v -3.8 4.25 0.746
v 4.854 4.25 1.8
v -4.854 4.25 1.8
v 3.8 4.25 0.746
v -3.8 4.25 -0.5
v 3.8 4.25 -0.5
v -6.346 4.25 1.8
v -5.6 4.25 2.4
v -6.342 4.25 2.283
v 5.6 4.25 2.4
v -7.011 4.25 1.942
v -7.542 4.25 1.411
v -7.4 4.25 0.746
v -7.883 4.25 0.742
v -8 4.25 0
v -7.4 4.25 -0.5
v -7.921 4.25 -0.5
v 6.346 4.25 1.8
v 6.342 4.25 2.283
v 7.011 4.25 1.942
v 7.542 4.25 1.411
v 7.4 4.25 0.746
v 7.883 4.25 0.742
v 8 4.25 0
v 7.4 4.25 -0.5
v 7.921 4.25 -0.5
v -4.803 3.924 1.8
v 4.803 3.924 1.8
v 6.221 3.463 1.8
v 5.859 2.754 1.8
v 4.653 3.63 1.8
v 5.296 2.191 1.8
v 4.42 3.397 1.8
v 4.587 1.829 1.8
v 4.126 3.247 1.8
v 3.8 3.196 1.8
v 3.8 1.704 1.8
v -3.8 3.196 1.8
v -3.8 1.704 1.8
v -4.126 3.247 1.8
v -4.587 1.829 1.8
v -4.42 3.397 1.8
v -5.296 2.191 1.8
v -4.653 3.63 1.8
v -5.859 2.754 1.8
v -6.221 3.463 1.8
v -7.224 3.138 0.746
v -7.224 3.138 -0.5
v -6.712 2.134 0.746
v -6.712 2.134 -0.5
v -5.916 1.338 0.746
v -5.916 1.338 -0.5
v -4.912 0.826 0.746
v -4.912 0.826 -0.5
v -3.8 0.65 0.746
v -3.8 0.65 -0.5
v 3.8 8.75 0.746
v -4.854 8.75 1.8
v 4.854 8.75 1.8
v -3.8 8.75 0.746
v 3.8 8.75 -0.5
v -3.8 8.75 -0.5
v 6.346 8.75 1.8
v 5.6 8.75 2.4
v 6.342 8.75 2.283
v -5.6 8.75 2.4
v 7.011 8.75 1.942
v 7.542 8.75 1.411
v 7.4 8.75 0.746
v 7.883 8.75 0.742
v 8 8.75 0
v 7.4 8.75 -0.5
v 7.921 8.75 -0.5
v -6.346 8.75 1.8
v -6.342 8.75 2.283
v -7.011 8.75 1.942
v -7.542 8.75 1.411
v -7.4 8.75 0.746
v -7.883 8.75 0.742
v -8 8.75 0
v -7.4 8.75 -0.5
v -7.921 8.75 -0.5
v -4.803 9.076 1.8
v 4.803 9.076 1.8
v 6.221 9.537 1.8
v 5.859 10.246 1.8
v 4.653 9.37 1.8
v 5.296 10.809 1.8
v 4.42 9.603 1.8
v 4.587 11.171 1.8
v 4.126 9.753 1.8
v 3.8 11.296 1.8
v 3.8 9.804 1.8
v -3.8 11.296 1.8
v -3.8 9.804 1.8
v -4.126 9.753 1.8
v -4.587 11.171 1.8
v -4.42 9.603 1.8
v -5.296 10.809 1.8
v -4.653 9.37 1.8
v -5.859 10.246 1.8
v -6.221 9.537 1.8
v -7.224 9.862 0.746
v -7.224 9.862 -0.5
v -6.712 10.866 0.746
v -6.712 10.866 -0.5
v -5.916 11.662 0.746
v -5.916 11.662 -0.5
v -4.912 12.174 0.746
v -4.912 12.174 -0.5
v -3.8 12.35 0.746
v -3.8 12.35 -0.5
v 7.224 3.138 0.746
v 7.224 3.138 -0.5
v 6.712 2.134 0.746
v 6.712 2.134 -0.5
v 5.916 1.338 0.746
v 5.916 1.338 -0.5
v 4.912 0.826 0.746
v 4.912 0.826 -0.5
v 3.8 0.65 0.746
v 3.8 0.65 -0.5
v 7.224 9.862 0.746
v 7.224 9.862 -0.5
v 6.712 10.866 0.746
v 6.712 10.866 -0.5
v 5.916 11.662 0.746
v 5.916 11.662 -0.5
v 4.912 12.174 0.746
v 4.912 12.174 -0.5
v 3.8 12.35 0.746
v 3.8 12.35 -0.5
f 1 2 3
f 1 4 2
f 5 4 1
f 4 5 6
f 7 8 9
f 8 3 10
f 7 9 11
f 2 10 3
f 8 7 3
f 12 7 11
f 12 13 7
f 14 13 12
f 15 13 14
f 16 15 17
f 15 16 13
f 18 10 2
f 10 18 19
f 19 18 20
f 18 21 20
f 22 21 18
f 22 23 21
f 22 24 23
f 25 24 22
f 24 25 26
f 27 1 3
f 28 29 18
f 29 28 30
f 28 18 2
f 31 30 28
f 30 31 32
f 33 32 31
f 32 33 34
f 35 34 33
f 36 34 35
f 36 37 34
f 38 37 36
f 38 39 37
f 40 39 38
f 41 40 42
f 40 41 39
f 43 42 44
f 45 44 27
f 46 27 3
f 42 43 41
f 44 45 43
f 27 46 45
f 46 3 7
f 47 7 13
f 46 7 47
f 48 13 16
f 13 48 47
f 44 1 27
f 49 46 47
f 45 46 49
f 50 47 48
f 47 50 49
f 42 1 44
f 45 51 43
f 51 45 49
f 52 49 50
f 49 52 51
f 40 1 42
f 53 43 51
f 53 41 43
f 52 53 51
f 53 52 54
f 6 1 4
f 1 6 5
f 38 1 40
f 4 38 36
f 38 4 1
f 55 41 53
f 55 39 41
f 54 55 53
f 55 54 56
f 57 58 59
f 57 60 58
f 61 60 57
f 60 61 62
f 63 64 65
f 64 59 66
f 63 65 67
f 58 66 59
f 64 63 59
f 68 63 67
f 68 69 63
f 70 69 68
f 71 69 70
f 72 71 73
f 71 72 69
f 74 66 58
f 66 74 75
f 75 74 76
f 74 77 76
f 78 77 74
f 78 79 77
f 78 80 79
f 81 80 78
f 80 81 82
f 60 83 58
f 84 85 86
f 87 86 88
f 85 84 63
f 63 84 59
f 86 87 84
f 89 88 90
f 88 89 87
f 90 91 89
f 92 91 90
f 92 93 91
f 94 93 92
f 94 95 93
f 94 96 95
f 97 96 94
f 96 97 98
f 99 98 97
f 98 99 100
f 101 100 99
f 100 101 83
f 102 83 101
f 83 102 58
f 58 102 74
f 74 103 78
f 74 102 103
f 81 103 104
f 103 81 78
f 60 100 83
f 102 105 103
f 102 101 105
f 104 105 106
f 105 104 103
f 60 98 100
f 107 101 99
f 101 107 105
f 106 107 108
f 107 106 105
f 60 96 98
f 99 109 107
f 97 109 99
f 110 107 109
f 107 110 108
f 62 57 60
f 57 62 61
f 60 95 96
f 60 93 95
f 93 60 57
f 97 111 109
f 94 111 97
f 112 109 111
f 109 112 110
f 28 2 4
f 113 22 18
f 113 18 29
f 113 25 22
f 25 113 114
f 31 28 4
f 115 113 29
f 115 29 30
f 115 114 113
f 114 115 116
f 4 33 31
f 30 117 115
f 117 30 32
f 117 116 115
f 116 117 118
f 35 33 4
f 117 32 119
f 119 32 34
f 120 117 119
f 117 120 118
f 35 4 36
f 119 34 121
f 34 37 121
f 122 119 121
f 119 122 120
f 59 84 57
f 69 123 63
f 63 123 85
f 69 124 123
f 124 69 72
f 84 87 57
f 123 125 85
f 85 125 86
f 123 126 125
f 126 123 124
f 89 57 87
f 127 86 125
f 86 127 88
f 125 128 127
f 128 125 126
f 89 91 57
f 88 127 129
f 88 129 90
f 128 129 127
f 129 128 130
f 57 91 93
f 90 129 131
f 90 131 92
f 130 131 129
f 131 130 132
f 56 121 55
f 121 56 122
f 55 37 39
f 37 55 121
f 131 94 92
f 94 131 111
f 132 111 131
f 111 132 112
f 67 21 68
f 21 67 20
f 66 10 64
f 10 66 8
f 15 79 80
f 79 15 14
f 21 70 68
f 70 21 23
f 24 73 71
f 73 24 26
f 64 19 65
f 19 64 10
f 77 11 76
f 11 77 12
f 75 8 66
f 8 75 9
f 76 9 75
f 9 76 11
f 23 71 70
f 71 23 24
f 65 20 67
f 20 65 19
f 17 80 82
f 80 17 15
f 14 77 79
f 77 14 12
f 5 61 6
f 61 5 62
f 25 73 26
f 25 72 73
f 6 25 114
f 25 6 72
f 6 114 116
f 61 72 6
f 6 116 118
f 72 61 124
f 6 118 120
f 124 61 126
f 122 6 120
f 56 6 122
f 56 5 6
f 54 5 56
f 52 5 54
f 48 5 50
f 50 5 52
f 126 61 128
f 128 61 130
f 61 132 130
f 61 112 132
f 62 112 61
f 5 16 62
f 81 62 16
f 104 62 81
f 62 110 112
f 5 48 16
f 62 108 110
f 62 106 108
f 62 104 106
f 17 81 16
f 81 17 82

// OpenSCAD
width = 4.5;
depth = 2.4;
height = 16;
$fn = 20;

inset = 0.6;
pipe_radius = depth - inset;

module middle() {
  rotate([90, 0, 0]) {
    hull()
      for (x = [depth, height-depth])
        translate([x, 0, 0])
          cylinder(h=width, r=depth);
  }
}

module octagon() {
  intersection_for(a = [0, 45])
    rotate([0, 0, a])
      square(pipe_radius*2, center=true);
}

module elbow() {
  rotate_extrude(angle = 90)
    translate([pipe_radius, 0])
      octagon();
}

module pipe_pack() {
  translate([-height/2, width/2, 0])
    middle();
  for (a = [-1, 1], b = [-1, 1])
    scale([a, b])
      translate([height/2 - pipe_radius - depth, width/2, 0])
        elbow();
  for (a = [-1, 1])
    scale([1, a, 1])
      translate([-height/2 + pipe_radius + depth, width/2 + pipe_radius, 0])
        rotate([0, 90, 0])
          linear_extrude(height - 2*pipe_radius - 2*depth)
            octagon();
}

translate([0, 6.5, 0]) {
  difference() {
    pipe_pack();
    translate([0, 0, -500.5])
      cube(1000, center=true);
  }
}
